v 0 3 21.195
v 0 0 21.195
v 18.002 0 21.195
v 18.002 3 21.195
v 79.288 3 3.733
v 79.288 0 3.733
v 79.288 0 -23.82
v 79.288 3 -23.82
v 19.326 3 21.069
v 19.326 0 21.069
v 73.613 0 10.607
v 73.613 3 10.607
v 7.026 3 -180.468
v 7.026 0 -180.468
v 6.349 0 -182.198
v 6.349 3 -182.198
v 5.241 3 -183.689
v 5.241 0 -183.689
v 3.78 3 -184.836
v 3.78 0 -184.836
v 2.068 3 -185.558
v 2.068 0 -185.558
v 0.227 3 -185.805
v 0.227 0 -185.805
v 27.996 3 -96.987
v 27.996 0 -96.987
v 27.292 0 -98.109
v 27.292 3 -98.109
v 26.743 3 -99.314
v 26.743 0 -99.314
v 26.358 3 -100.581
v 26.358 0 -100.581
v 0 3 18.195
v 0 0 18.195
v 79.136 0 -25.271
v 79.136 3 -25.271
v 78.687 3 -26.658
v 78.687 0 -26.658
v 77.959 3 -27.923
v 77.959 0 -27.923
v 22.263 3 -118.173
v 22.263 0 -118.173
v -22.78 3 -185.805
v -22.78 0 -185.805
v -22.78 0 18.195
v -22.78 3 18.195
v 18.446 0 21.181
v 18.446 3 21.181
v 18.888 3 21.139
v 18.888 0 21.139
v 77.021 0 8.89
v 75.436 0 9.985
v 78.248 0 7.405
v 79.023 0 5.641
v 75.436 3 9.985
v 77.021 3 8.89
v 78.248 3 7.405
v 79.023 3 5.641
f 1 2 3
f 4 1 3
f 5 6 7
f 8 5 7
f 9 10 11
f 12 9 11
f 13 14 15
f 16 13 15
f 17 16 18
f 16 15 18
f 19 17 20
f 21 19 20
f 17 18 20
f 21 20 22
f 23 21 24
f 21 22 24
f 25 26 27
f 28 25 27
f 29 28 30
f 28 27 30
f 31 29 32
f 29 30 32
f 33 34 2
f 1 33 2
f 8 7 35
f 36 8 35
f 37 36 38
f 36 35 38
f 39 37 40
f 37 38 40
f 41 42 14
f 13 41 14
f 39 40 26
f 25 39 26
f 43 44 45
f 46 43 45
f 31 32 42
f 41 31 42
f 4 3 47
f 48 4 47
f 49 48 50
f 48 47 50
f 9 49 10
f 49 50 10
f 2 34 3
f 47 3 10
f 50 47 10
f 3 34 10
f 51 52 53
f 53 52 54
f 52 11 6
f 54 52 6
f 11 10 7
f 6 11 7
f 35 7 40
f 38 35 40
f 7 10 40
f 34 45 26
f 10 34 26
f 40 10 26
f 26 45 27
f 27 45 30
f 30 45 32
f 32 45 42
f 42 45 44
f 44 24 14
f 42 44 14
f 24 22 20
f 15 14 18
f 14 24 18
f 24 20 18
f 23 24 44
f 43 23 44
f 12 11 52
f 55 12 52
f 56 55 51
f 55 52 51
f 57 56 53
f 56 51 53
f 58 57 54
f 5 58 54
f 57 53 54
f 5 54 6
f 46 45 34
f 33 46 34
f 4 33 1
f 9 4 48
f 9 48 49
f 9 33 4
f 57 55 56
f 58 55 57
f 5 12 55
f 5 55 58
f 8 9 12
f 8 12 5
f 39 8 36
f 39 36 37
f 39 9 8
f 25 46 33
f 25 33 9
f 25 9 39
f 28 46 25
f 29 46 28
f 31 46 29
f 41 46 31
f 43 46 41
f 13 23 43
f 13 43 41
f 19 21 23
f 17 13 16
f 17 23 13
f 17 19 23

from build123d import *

# Parameters (mm, degrees)
SALIENTE_EXTRUIR1_DEPTH = 3


with BuildPart() as part:
    # Croquis1 → Saliente-Extruir1 (new body)
    with BuildSketch(Plane(origin=(0, 0, 0), x_dir=(1, 0, 0), z_dir=(0, 1, 0))):
        with BuildLine():
            Line((0.226595449, 185.804586765), (-22.78, 185.804586765))
            Line((-22.78, 185.804586765), (-22.78, -18.195413235))
            Line((-22.78, -18.195413235), (0, -18.195413235))
            Line((0, -18.195413235), (0, -21.195413235))
            Line((0, -21.195413235), (18.001591933, -21.195413235))
            ThreePointArc((18.001591933, -21.195413235), (18.666950073, -21.163719955), (19.326283246, -21.068927105))
            Line((19.326283246, -21.068927105), (73.612622199, -10.606644927))
            ThreePointArc((73.612622199, -10.606644927), (77.685747073, -8.18998874), (79.287930885, -3.733131057))
            Line((79.287930885, -3.733131057), (79.287930885, 23.819925262))
            ThreePointArc((79.287930885, 23.819925262), (78.94752374, 25.976270087), (77.959410027, 27.922890572))
            Line((77.959410027, 27.922890572), (27.995644059, 96.987197766))
            ThreePointArc((27.995644059, 96.987197766), (26.997710984, 98.702595555), (26.358179585, 100.581281157))
            Line((26.358179585, 100.581281157), (22.262888034, 118.173345099))
            Line((22.262888034, 118.173345099), (7.026156274, 180.467708103))
            ThreePointArc((7.026156274, 180.467708103), (4.548525031, 184.311030689), (0.226595449, 185.804586765))
        make_face()
    extrude(amount=SALIENTE_EXTRUIR1_DEPTH)


solid = part.part
